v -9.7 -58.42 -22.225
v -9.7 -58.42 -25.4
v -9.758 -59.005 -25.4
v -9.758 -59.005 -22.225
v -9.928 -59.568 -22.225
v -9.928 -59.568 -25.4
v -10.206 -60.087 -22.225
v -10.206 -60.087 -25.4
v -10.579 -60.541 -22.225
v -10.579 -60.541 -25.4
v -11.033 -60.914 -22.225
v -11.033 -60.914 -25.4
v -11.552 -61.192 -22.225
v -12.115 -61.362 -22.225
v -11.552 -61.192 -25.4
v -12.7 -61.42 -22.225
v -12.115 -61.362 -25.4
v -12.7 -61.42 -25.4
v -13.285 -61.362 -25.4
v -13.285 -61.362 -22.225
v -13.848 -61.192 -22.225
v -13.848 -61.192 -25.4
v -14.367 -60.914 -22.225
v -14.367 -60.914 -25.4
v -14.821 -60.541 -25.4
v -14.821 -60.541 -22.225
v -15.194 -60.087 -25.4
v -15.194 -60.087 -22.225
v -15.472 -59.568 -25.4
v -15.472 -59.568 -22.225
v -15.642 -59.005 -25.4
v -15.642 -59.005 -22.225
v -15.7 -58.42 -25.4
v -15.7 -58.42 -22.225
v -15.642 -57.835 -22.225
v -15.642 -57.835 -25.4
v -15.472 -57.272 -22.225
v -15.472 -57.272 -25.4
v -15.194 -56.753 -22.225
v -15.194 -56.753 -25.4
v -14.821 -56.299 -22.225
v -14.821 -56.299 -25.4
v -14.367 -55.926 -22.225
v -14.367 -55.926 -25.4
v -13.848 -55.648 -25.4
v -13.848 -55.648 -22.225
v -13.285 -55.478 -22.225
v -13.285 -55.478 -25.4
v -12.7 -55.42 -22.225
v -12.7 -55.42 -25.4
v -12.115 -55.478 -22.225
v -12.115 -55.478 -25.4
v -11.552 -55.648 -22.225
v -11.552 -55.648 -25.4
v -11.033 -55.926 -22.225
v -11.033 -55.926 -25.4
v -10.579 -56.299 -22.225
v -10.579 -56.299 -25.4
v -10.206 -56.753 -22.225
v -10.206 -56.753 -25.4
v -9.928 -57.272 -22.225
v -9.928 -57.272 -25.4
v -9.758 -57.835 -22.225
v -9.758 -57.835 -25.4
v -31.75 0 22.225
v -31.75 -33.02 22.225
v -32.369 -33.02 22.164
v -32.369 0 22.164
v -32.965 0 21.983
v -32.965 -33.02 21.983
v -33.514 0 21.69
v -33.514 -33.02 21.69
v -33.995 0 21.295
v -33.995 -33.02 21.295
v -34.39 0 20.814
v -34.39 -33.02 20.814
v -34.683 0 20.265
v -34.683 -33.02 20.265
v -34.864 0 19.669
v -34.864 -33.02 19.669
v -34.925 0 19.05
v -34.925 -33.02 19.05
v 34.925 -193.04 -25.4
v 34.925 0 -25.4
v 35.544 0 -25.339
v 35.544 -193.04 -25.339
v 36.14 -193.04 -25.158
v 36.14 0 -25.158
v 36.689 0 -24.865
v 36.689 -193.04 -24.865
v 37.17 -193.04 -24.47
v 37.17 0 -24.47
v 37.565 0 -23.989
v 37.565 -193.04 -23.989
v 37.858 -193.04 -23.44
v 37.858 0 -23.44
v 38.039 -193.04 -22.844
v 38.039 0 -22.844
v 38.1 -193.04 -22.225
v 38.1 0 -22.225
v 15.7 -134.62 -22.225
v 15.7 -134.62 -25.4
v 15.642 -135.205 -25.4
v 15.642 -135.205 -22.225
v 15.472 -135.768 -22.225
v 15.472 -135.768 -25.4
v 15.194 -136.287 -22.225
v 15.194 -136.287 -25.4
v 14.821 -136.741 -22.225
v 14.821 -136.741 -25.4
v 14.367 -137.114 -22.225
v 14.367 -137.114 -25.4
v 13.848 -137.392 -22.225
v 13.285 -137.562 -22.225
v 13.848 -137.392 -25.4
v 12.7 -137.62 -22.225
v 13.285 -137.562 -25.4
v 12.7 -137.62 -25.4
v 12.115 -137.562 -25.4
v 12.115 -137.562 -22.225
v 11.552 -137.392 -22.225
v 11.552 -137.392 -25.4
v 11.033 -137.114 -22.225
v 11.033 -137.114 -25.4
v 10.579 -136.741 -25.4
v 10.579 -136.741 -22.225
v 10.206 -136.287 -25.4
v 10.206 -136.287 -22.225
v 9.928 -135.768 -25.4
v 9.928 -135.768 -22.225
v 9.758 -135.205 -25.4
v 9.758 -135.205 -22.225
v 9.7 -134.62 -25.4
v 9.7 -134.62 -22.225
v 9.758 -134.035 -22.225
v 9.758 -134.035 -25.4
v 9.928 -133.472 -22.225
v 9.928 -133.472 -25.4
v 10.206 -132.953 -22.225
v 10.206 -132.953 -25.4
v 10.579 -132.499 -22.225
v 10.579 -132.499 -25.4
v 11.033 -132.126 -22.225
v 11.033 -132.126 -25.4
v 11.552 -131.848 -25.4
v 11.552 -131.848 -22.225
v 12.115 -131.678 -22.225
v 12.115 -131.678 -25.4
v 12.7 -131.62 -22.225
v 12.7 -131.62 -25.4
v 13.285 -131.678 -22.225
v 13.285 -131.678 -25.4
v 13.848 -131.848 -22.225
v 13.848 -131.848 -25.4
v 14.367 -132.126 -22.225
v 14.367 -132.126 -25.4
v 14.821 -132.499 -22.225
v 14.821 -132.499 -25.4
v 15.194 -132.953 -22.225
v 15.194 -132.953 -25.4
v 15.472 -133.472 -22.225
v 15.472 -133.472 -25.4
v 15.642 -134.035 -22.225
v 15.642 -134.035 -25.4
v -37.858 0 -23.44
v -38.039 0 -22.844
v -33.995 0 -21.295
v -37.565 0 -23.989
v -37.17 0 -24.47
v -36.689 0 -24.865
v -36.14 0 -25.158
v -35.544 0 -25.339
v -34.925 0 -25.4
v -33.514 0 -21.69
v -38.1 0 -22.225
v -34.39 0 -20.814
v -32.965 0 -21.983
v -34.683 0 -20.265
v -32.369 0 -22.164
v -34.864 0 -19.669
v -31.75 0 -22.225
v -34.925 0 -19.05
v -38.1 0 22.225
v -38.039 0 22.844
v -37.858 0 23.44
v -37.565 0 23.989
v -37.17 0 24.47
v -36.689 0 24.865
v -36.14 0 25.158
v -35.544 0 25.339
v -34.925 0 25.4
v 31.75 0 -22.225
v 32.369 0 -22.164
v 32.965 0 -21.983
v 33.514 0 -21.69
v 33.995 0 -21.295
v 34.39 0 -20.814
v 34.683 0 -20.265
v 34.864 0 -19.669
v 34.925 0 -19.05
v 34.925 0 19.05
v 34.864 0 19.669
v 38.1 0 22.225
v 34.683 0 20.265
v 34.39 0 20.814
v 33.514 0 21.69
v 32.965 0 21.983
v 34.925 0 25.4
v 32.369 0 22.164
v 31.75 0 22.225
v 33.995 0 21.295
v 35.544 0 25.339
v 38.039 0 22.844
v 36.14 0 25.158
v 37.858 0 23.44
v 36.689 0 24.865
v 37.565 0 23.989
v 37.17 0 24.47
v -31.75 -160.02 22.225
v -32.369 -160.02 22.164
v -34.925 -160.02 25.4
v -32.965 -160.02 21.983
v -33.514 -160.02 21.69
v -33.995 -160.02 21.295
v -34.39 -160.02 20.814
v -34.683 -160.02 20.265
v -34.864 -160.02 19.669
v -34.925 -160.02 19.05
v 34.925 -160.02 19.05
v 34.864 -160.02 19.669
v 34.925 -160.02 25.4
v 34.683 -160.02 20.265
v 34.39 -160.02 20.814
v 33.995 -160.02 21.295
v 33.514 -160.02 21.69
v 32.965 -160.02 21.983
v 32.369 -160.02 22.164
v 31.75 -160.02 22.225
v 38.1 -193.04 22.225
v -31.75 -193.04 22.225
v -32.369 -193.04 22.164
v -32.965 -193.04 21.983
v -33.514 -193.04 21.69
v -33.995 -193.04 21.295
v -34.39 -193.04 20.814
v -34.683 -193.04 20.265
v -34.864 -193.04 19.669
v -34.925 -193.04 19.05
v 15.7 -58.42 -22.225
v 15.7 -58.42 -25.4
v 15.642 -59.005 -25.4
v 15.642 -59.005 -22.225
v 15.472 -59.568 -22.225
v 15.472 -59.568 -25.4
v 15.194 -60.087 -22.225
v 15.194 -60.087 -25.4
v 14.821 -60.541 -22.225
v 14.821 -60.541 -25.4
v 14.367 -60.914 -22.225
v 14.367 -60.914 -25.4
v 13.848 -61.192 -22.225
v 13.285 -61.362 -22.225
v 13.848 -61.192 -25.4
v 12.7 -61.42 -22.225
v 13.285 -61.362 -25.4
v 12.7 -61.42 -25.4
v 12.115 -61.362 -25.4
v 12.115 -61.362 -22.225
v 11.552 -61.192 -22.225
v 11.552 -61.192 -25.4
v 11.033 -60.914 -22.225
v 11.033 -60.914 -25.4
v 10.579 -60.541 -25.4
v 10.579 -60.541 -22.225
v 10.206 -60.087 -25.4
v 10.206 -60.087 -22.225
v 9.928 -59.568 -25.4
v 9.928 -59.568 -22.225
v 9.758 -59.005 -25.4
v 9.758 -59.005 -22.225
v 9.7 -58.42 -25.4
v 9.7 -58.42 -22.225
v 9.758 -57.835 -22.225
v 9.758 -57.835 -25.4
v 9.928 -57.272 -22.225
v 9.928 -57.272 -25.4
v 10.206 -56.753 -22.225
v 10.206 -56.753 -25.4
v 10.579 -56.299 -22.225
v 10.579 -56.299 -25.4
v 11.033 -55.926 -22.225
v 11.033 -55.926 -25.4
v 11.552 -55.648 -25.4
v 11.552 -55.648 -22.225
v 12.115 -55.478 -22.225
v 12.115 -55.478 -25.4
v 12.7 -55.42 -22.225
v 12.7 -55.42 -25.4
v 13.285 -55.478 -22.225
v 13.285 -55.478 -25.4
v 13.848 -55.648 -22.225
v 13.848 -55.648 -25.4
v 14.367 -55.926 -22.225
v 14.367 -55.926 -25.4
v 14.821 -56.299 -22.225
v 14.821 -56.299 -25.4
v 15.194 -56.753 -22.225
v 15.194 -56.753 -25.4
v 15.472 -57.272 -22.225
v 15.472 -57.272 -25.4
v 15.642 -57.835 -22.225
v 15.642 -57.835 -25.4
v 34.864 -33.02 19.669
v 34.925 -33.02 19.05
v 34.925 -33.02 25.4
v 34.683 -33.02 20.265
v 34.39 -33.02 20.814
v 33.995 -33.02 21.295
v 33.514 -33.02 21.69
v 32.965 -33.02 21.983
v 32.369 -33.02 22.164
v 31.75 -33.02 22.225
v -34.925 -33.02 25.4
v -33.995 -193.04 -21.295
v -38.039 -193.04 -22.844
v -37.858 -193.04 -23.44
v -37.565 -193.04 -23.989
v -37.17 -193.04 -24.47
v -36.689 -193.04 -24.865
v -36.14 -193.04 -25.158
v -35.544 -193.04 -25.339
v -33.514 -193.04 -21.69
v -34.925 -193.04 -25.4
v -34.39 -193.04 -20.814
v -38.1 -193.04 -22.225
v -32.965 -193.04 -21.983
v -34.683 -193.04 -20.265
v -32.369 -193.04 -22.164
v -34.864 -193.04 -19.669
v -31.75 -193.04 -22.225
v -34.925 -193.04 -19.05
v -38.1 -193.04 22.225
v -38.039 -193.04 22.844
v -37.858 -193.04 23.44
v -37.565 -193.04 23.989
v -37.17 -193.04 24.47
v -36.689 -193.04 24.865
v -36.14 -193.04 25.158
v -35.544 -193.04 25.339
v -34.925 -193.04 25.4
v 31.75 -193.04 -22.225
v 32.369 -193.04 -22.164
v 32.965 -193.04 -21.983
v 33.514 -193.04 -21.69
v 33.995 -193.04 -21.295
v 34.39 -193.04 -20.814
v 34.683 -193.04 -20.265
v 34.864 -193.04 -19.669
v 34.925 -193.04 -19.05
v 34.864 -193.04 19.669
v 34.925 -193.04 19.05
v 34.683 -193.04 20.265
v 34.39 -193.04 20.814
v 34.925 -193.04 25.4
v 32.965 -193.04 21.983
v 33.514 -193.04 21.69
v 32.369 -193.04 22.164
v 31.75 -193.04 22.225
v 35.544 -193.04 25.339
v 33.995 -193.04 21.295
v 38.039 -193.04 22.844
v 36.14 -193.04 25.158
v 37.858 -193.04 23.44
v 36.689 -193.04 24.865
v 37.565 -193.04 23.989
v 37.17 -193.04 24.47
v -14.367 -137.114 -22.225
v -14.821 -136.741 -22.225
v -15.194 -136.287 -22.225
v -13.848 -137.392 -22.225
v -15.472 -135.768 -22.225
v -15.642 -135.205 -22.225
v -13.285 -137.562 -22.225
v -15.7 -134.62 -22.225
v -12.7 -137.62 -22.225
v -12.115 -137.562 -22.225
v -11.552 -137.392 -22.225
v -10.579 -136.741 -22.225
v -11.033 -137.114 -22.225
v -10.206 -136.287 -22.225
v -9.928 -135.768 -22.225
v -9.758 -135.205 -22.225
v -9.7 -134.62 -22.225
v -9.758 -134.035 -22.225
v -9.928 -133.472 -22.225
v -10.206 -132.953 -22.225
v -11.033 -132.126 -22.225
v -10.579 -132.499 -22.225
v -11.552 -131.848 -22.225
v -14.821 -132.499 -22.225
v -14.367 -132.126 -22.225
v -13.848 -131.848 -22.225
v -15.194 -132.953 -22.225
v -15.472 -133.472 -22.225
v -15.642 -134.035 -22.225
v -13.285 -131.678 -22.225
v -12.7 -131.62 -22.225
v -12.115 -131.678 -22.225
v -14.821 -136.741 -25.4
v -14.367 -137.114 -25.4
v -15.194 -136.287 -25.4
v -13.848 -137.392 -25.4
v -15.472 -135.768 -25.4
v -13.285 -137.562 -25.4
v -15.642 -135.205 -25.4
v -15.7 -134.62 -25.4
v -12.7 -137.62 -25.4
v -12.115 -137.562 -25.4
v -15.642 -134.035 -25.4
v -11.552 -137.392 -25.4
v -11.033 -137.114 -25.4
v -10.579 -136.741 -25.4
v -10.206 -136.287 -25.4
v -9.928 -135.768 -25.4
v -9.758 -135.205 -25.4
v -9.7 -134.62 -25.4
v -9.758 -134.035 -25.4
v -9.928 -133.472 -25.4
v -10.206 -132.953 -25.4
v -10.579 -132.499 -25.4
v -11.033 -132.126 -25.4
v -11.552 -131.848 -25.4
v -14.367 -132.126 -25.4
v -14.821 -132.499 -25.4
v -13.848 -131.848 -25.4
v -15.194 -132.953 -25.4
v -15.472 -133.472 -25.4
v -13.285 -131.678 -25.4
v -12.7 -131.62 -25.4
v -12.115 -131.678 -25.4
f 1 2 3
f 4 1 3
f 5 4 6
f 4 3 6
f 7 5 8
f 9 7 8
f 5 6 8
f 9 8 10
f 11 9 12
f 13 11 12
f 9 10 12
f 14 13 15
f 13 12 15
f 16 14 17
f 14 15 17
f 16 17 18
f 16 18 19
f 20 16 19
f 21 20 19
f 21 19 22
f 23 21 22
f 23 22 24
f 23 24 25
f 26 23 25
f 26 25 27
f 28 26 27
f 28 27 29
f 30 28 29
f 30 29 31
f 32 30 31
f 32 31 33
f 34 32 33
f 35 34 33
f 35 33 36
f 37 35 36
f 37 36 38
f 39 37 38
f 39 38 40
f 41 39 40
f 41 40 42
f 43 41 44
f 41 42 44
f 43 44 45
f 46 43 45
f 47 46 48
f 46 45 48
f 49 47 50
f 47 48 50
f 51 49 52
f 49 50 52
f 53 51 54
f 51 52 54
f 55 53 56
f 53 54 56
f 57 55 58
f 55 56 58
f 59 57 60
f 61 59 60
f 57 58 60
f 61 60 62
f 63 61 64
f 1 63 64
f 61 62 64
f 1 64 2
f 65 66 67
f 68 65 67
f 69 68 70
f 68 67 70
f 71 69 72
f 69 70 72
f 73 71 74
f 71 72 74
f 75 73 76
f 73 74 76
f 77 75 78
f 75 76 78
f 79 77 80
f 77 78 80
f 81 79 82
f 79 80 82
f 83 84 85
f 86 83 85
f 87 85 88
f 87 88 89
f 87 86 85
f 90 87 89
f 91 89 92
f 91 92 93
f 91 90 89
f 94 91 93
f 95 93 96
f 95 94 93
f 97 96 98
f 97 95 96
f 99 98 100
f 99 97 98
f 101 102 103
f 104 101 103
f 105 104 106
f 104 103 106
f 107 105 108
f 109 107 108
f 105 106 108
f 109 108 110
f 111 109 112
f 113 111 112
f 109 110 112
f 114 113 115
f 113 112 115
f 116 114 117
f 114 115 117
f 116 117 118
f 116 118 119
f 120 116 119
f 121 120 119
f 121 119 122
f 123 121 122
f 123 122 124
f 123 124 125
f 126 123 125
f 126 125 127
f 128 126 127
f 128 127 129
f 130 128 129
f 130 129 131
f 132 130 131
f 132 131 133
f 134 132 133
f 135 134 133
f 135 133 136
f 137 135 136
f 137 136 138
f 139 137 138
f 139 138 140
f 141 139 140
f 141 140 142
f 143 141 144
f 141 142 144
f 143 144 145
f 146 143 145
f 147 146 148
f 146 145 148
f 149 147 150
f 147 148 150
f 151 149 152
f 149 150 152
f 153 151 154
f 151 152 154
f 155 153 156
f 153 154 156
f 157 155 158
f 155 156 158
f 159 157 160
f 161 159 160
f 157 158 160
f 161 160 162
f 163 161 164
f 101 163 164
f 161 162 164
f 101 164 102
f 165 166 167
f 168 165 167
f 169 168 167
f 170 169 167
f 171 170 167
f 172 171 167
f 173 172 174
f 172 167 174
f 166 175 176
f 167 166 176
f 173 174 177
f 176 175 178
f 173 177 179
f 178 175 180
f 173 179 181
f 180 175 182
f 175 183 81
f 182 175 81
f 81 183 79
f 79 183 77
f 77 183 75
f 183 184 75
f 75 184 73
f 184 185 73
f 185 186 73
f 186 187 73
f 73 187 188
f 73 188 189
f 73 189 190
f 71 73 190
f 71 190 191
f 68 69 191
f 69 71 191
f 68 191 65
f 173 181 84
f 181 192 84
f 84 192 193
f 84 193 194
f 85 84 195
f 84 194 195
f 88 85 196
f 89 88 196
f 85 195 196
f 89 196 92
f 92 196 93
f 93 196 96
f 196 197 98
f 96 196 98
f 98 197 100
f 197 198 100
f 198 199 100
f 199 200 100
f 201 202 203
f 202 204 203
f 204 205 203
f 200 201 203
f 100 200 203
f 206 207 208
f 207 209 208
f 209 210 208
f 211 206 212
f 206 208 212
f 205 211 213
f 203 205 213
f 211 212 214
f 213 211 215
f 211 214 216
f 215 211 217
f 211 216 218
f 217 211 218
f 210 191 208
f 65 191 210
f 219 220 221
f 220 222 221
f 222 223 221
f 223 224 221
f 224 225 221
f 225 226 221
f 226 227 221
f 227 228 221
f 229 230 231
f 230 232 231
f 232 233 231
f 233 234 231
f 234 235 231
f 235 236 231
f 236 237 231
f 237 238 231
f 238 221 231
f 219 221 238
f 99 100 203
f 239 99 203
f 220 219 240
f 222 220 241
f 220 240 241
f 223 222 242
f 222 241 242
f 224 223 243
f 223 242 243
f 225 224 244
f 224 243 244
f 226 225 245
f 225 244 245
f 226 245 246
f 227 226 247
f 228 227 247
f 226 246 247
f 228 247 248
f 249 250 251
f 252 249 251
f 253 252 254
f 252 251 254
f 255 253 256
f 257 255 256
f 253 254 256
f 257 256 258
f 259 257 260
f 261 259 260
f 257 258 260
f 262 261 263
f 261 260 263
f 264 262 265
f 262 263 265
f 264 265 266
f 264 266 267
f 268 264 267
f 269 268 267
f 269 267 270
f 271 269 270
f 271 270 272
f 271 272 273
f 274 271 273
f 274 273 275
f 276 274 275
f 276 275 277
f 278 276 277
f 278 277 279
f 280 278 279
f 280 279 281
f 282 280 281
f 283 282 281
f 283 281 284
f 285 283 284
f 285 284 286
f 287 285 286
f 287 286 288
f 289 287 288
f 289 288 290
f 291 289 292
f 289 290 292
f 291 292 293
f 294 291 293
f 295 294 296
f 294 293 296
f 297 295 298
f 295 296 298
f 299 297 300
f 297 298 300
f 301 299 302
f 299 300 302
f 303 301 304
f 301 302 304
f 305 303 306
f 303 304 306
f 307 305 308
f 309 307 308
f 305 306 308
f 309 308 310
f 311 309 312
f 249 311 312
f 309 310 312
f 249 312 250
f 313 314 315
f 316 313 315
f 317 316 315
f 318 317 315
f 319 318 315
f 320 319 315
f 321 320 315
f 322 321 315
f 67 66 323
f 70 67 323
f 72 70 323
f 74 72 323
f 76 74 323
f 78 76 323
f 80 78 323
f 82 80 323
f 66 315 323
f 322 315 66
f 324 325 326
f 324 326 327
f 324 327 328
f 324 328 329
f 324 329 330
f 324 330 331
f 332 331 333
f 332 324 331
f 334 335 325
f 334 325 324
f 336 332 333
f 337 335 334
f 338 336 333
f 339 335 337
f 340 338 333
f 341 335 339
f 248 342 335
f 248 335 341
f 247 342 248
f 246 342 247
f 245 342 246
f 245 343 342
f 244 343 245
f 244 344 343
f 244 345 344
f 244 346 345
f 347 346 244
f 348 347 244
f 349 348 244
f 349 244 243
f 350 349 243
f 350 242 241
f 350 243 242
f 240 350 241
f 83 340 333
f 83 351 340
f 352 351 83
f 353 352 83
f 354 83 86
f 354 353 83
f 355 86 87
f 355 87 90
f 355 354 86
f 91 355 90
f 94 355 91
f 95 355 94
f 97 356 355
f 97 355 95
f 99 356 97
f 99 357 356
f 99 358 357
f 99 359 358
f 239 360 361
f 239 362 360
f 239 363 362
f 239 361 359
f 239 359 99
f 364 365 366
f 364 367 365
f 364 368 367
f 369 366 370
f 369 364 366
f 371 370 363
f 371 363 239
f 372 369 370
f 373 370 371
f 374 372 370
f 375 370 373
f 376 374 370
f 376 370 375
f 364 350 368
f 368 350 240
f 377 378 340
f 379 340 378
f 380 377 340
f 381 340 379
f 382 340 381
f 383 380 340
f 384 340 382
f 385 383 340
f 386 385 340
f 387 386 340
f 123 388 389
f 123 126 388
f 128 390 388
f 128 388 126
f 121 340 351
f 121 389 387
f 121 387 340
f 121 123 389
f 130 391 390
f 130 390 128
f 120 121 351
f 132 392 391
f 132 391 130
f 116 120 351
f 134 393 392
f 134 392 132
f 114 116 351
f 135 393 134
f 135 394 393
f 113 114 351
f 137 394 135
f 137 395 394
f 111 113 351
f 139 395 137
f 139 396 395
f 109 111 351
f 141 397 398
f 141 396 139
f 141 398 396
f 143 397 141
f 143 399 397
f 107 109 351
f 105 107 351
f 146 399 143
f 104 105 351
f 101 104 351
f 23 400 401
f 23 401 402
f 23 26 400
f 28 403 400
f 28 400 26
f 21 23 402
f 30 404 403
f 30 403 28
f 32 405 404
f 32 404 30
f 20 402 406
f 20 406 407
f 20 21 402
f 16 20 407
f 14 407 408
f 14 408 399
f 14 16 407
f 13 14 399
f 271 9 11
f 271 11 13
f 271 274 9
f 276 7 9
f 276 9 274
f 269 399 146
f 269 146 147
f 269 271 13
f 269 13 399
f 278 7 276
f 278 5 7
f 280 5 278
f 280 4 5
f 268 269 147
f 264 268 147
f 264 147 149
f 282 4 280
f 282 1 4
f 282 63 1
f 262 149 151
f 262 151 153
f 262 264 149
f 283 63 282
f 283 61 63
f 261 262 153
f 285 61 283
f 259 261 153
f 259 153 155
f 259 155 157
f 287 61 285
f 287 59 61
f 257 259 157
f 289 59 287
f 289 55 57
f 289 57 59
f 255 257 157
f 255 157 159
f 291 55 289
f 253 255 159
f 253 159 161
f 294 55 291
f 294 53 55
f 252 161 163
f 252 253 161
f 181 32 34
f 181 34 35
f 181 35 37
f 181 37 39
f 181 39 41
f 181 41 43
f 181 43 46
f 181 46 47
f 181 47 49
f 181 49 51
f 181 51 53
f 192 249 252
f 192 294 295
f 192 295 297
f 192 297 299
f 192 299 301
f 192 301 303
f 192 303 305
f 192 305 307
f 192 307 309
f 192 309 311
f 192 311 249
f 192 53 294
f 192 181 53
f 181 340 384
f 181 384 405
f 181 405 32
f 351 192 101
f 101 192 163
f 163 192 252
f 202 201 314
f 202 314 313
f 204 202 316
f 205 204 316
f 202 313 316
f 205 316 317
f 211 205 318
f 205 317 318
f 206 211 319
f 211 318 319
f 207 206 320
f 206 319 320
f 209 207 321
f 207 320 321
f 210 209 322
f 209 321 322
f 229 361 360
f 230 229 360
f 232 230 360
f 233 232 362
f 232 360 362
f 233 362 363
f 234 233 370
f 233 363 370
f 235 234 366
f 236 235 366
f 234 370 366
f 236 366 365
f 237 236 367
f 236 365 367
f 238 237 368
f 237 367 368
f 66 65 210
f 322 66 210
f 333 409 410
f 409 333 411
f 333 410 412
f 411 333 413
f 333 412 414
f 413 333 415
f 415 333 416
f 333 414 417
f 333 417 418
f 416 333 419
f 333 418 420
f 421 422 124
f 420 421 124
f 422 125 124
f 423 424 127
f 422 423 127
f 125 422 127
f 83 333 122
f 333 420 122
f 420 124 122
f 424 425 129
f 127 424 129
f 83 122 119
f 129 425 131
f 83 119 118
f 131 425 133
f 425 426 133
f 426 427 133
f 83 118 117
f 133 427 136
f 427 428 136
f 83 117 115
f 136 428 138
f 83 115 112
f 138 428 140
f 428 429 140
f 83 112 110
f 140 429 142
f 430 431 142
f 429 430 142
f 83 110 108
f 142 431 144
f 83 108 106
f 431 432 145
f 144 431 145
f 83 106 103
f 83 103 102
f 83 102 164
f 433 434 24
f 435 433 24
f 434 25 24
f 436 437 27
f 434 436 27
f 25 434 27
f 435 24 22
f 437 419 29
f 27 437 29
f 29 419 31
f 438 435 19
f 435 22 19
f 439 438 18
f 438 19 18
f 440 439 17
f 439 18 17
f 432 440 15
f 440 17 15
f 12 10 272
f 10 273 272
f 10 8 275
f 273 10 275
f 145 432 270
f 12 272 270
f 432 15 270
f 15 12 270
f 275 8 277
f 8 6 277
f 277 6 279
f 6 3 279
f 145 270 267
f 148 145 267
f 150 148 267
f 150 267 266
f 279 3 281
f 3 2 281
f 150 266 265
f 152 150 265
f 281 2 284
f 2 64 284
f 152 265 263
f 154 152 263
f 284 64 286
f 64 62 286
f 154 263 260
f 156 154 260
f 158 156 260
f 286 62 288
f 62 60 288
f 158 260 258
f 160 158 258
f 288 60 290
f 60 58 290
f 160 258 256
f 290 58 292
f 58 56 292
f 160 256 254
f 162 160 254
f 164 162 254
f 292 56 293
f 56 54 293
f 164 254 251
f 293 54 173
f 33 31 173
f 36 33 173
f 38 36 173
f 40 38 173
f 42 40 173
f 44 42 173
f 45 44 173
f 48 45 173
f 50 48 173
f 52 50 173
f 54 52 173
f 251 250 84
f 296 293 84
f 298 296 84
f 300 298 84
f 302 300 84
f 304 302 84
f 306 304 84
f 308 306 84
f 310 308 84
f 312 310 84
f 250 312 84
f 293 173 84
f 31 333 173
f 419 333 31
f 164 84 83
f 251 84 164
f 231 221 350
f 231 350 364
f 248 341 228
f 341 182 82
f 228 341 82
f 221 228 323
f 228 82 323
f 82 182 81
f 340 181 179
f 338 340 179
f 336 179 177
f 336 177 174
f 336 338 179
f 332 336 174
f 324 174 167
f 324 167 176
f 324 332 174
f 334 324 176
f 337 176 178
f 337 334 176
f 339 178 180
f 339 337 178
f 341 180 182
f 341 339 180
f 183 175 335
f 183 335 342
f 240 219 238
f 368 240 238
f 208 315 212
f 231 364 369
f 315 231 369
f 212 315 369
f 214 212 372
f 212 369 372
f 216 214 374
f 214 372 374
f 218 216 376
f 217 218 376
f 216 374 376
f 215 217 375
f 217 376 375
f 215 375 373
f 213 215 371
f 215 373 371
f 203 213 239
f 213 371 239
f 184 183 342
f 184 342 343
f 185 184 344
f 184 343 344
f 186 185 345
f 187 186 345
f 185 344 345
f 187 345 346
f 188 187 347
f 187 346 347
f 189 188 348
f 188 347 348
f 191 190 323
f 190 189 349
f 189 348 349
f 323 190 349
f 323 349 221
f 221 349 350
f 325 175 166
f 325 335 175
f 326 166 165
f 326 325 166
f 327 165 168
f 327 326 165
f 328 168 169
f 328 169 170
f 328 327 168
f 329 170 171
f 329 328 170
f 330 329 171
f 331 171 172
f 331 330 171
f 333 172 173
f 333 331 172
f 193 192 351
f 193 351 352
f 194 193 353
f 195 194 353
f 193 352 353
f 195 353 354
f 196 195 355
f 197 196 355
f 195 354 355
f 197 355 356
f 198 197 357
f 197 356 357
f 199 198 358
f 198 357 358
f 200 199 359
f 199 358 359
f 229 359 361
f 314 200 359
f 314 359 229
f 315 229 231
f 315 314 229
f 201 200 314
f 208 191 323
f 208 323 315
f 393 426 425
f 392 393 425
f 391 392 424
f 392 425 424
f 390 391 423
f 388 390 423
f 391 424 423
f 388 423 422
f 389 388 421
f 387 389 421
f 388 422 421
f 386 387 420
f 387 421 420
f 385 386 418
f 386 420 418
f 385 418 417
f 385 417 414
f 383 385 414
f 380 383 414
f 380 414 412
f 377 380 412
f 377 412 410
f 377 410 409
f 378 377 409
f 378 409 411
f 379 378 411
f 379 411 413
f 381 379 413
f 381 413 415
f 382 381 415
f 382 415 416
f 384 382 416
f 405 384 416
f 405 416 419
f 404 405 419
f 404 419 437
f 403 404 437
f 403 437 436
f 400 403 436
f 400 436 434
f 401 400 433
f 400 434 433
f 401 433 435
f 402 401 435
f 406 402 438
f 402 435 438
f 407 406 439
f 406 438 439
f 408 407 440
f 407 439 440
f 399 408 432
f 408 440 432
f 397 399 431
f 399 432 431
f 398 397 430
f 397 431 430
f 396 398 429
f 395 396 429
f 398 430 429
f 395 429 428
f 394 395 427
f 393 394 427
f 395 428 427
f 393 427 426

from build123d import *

# Parameters (mm, degrees)
F0_W     = 76.2
F0_H     = 50.8
F0_W_2   = 69.85
F0_H_2   = 44.45
F2_DEPTH = 193.04
F3_R     = 3.175
F4_R     = 3
F5_DEPTH = 25.4
F7_DEPTH = 25.4


# Not quite as in the source:
# - a variable given as a bare number and used for a length is read in inches; the dataset says mm whatever the document's units were


with BuildPart() as f2:
    # F0 (on Front) → F2 (new body)
    with BuildSketch(Plane.XZ):
        Rectangle(F0_W, F0_H)
        Rectangle(F0_W_2, F0_H_2, mode=Mode.SUBTRACT)
    extrude(amount=F2_DEPTH)

    # F3
    f3_edges = [f2.edges().sort_by_distance(p)[0] for p in [
        (-38.1, -96.52, -25.4),
        (-38.1, -96.52, 25.4),
        (38.1, -96.52, -25.4),
        (38.1, -96.52, 25.4),
        (-34.925, -96.52, -22.225),
        (-34.925, -96.52, 22.225),
        (34.925, -96.52, 22.225),
        (34.925, -96.52, -22.225),
    ]]
    fillet(f3_edges, radius=F3_R)

    # F4 (on face) → F5 (cut)
    with BuildSketch(Plane(origin=(0, 0, -25.4), x_dir=(1, 0, 0), z_dir=(0, 0, -1))):
        with Locations((-12.7, 58.42)):
            Circle(F4_R)
        with Locations((12.7, 58.42)):
            Circle(F4_R)
        with Locations((12.7, 134.62)):
            Circle(F4_R)
        with Locations((-12.7, 134.62)):
            Circle(F4_R)
    extrude(amount=-F5_DEPTH, mode=Mode.SUBTRACT)

    # F6 (on face) → F7 (cut)
    with BuildSketch(Plane.XY.offset(25.4)):
        Polygon((34.925, -33.02), (0, -33.02), (-34.925, -33.02), (-34.925, -160.02), (34.925, -160.02), align=None)
    extrude(amount=-F7_DEPTH, mode=Mode.SUBTRACT)


solid = f2.part
